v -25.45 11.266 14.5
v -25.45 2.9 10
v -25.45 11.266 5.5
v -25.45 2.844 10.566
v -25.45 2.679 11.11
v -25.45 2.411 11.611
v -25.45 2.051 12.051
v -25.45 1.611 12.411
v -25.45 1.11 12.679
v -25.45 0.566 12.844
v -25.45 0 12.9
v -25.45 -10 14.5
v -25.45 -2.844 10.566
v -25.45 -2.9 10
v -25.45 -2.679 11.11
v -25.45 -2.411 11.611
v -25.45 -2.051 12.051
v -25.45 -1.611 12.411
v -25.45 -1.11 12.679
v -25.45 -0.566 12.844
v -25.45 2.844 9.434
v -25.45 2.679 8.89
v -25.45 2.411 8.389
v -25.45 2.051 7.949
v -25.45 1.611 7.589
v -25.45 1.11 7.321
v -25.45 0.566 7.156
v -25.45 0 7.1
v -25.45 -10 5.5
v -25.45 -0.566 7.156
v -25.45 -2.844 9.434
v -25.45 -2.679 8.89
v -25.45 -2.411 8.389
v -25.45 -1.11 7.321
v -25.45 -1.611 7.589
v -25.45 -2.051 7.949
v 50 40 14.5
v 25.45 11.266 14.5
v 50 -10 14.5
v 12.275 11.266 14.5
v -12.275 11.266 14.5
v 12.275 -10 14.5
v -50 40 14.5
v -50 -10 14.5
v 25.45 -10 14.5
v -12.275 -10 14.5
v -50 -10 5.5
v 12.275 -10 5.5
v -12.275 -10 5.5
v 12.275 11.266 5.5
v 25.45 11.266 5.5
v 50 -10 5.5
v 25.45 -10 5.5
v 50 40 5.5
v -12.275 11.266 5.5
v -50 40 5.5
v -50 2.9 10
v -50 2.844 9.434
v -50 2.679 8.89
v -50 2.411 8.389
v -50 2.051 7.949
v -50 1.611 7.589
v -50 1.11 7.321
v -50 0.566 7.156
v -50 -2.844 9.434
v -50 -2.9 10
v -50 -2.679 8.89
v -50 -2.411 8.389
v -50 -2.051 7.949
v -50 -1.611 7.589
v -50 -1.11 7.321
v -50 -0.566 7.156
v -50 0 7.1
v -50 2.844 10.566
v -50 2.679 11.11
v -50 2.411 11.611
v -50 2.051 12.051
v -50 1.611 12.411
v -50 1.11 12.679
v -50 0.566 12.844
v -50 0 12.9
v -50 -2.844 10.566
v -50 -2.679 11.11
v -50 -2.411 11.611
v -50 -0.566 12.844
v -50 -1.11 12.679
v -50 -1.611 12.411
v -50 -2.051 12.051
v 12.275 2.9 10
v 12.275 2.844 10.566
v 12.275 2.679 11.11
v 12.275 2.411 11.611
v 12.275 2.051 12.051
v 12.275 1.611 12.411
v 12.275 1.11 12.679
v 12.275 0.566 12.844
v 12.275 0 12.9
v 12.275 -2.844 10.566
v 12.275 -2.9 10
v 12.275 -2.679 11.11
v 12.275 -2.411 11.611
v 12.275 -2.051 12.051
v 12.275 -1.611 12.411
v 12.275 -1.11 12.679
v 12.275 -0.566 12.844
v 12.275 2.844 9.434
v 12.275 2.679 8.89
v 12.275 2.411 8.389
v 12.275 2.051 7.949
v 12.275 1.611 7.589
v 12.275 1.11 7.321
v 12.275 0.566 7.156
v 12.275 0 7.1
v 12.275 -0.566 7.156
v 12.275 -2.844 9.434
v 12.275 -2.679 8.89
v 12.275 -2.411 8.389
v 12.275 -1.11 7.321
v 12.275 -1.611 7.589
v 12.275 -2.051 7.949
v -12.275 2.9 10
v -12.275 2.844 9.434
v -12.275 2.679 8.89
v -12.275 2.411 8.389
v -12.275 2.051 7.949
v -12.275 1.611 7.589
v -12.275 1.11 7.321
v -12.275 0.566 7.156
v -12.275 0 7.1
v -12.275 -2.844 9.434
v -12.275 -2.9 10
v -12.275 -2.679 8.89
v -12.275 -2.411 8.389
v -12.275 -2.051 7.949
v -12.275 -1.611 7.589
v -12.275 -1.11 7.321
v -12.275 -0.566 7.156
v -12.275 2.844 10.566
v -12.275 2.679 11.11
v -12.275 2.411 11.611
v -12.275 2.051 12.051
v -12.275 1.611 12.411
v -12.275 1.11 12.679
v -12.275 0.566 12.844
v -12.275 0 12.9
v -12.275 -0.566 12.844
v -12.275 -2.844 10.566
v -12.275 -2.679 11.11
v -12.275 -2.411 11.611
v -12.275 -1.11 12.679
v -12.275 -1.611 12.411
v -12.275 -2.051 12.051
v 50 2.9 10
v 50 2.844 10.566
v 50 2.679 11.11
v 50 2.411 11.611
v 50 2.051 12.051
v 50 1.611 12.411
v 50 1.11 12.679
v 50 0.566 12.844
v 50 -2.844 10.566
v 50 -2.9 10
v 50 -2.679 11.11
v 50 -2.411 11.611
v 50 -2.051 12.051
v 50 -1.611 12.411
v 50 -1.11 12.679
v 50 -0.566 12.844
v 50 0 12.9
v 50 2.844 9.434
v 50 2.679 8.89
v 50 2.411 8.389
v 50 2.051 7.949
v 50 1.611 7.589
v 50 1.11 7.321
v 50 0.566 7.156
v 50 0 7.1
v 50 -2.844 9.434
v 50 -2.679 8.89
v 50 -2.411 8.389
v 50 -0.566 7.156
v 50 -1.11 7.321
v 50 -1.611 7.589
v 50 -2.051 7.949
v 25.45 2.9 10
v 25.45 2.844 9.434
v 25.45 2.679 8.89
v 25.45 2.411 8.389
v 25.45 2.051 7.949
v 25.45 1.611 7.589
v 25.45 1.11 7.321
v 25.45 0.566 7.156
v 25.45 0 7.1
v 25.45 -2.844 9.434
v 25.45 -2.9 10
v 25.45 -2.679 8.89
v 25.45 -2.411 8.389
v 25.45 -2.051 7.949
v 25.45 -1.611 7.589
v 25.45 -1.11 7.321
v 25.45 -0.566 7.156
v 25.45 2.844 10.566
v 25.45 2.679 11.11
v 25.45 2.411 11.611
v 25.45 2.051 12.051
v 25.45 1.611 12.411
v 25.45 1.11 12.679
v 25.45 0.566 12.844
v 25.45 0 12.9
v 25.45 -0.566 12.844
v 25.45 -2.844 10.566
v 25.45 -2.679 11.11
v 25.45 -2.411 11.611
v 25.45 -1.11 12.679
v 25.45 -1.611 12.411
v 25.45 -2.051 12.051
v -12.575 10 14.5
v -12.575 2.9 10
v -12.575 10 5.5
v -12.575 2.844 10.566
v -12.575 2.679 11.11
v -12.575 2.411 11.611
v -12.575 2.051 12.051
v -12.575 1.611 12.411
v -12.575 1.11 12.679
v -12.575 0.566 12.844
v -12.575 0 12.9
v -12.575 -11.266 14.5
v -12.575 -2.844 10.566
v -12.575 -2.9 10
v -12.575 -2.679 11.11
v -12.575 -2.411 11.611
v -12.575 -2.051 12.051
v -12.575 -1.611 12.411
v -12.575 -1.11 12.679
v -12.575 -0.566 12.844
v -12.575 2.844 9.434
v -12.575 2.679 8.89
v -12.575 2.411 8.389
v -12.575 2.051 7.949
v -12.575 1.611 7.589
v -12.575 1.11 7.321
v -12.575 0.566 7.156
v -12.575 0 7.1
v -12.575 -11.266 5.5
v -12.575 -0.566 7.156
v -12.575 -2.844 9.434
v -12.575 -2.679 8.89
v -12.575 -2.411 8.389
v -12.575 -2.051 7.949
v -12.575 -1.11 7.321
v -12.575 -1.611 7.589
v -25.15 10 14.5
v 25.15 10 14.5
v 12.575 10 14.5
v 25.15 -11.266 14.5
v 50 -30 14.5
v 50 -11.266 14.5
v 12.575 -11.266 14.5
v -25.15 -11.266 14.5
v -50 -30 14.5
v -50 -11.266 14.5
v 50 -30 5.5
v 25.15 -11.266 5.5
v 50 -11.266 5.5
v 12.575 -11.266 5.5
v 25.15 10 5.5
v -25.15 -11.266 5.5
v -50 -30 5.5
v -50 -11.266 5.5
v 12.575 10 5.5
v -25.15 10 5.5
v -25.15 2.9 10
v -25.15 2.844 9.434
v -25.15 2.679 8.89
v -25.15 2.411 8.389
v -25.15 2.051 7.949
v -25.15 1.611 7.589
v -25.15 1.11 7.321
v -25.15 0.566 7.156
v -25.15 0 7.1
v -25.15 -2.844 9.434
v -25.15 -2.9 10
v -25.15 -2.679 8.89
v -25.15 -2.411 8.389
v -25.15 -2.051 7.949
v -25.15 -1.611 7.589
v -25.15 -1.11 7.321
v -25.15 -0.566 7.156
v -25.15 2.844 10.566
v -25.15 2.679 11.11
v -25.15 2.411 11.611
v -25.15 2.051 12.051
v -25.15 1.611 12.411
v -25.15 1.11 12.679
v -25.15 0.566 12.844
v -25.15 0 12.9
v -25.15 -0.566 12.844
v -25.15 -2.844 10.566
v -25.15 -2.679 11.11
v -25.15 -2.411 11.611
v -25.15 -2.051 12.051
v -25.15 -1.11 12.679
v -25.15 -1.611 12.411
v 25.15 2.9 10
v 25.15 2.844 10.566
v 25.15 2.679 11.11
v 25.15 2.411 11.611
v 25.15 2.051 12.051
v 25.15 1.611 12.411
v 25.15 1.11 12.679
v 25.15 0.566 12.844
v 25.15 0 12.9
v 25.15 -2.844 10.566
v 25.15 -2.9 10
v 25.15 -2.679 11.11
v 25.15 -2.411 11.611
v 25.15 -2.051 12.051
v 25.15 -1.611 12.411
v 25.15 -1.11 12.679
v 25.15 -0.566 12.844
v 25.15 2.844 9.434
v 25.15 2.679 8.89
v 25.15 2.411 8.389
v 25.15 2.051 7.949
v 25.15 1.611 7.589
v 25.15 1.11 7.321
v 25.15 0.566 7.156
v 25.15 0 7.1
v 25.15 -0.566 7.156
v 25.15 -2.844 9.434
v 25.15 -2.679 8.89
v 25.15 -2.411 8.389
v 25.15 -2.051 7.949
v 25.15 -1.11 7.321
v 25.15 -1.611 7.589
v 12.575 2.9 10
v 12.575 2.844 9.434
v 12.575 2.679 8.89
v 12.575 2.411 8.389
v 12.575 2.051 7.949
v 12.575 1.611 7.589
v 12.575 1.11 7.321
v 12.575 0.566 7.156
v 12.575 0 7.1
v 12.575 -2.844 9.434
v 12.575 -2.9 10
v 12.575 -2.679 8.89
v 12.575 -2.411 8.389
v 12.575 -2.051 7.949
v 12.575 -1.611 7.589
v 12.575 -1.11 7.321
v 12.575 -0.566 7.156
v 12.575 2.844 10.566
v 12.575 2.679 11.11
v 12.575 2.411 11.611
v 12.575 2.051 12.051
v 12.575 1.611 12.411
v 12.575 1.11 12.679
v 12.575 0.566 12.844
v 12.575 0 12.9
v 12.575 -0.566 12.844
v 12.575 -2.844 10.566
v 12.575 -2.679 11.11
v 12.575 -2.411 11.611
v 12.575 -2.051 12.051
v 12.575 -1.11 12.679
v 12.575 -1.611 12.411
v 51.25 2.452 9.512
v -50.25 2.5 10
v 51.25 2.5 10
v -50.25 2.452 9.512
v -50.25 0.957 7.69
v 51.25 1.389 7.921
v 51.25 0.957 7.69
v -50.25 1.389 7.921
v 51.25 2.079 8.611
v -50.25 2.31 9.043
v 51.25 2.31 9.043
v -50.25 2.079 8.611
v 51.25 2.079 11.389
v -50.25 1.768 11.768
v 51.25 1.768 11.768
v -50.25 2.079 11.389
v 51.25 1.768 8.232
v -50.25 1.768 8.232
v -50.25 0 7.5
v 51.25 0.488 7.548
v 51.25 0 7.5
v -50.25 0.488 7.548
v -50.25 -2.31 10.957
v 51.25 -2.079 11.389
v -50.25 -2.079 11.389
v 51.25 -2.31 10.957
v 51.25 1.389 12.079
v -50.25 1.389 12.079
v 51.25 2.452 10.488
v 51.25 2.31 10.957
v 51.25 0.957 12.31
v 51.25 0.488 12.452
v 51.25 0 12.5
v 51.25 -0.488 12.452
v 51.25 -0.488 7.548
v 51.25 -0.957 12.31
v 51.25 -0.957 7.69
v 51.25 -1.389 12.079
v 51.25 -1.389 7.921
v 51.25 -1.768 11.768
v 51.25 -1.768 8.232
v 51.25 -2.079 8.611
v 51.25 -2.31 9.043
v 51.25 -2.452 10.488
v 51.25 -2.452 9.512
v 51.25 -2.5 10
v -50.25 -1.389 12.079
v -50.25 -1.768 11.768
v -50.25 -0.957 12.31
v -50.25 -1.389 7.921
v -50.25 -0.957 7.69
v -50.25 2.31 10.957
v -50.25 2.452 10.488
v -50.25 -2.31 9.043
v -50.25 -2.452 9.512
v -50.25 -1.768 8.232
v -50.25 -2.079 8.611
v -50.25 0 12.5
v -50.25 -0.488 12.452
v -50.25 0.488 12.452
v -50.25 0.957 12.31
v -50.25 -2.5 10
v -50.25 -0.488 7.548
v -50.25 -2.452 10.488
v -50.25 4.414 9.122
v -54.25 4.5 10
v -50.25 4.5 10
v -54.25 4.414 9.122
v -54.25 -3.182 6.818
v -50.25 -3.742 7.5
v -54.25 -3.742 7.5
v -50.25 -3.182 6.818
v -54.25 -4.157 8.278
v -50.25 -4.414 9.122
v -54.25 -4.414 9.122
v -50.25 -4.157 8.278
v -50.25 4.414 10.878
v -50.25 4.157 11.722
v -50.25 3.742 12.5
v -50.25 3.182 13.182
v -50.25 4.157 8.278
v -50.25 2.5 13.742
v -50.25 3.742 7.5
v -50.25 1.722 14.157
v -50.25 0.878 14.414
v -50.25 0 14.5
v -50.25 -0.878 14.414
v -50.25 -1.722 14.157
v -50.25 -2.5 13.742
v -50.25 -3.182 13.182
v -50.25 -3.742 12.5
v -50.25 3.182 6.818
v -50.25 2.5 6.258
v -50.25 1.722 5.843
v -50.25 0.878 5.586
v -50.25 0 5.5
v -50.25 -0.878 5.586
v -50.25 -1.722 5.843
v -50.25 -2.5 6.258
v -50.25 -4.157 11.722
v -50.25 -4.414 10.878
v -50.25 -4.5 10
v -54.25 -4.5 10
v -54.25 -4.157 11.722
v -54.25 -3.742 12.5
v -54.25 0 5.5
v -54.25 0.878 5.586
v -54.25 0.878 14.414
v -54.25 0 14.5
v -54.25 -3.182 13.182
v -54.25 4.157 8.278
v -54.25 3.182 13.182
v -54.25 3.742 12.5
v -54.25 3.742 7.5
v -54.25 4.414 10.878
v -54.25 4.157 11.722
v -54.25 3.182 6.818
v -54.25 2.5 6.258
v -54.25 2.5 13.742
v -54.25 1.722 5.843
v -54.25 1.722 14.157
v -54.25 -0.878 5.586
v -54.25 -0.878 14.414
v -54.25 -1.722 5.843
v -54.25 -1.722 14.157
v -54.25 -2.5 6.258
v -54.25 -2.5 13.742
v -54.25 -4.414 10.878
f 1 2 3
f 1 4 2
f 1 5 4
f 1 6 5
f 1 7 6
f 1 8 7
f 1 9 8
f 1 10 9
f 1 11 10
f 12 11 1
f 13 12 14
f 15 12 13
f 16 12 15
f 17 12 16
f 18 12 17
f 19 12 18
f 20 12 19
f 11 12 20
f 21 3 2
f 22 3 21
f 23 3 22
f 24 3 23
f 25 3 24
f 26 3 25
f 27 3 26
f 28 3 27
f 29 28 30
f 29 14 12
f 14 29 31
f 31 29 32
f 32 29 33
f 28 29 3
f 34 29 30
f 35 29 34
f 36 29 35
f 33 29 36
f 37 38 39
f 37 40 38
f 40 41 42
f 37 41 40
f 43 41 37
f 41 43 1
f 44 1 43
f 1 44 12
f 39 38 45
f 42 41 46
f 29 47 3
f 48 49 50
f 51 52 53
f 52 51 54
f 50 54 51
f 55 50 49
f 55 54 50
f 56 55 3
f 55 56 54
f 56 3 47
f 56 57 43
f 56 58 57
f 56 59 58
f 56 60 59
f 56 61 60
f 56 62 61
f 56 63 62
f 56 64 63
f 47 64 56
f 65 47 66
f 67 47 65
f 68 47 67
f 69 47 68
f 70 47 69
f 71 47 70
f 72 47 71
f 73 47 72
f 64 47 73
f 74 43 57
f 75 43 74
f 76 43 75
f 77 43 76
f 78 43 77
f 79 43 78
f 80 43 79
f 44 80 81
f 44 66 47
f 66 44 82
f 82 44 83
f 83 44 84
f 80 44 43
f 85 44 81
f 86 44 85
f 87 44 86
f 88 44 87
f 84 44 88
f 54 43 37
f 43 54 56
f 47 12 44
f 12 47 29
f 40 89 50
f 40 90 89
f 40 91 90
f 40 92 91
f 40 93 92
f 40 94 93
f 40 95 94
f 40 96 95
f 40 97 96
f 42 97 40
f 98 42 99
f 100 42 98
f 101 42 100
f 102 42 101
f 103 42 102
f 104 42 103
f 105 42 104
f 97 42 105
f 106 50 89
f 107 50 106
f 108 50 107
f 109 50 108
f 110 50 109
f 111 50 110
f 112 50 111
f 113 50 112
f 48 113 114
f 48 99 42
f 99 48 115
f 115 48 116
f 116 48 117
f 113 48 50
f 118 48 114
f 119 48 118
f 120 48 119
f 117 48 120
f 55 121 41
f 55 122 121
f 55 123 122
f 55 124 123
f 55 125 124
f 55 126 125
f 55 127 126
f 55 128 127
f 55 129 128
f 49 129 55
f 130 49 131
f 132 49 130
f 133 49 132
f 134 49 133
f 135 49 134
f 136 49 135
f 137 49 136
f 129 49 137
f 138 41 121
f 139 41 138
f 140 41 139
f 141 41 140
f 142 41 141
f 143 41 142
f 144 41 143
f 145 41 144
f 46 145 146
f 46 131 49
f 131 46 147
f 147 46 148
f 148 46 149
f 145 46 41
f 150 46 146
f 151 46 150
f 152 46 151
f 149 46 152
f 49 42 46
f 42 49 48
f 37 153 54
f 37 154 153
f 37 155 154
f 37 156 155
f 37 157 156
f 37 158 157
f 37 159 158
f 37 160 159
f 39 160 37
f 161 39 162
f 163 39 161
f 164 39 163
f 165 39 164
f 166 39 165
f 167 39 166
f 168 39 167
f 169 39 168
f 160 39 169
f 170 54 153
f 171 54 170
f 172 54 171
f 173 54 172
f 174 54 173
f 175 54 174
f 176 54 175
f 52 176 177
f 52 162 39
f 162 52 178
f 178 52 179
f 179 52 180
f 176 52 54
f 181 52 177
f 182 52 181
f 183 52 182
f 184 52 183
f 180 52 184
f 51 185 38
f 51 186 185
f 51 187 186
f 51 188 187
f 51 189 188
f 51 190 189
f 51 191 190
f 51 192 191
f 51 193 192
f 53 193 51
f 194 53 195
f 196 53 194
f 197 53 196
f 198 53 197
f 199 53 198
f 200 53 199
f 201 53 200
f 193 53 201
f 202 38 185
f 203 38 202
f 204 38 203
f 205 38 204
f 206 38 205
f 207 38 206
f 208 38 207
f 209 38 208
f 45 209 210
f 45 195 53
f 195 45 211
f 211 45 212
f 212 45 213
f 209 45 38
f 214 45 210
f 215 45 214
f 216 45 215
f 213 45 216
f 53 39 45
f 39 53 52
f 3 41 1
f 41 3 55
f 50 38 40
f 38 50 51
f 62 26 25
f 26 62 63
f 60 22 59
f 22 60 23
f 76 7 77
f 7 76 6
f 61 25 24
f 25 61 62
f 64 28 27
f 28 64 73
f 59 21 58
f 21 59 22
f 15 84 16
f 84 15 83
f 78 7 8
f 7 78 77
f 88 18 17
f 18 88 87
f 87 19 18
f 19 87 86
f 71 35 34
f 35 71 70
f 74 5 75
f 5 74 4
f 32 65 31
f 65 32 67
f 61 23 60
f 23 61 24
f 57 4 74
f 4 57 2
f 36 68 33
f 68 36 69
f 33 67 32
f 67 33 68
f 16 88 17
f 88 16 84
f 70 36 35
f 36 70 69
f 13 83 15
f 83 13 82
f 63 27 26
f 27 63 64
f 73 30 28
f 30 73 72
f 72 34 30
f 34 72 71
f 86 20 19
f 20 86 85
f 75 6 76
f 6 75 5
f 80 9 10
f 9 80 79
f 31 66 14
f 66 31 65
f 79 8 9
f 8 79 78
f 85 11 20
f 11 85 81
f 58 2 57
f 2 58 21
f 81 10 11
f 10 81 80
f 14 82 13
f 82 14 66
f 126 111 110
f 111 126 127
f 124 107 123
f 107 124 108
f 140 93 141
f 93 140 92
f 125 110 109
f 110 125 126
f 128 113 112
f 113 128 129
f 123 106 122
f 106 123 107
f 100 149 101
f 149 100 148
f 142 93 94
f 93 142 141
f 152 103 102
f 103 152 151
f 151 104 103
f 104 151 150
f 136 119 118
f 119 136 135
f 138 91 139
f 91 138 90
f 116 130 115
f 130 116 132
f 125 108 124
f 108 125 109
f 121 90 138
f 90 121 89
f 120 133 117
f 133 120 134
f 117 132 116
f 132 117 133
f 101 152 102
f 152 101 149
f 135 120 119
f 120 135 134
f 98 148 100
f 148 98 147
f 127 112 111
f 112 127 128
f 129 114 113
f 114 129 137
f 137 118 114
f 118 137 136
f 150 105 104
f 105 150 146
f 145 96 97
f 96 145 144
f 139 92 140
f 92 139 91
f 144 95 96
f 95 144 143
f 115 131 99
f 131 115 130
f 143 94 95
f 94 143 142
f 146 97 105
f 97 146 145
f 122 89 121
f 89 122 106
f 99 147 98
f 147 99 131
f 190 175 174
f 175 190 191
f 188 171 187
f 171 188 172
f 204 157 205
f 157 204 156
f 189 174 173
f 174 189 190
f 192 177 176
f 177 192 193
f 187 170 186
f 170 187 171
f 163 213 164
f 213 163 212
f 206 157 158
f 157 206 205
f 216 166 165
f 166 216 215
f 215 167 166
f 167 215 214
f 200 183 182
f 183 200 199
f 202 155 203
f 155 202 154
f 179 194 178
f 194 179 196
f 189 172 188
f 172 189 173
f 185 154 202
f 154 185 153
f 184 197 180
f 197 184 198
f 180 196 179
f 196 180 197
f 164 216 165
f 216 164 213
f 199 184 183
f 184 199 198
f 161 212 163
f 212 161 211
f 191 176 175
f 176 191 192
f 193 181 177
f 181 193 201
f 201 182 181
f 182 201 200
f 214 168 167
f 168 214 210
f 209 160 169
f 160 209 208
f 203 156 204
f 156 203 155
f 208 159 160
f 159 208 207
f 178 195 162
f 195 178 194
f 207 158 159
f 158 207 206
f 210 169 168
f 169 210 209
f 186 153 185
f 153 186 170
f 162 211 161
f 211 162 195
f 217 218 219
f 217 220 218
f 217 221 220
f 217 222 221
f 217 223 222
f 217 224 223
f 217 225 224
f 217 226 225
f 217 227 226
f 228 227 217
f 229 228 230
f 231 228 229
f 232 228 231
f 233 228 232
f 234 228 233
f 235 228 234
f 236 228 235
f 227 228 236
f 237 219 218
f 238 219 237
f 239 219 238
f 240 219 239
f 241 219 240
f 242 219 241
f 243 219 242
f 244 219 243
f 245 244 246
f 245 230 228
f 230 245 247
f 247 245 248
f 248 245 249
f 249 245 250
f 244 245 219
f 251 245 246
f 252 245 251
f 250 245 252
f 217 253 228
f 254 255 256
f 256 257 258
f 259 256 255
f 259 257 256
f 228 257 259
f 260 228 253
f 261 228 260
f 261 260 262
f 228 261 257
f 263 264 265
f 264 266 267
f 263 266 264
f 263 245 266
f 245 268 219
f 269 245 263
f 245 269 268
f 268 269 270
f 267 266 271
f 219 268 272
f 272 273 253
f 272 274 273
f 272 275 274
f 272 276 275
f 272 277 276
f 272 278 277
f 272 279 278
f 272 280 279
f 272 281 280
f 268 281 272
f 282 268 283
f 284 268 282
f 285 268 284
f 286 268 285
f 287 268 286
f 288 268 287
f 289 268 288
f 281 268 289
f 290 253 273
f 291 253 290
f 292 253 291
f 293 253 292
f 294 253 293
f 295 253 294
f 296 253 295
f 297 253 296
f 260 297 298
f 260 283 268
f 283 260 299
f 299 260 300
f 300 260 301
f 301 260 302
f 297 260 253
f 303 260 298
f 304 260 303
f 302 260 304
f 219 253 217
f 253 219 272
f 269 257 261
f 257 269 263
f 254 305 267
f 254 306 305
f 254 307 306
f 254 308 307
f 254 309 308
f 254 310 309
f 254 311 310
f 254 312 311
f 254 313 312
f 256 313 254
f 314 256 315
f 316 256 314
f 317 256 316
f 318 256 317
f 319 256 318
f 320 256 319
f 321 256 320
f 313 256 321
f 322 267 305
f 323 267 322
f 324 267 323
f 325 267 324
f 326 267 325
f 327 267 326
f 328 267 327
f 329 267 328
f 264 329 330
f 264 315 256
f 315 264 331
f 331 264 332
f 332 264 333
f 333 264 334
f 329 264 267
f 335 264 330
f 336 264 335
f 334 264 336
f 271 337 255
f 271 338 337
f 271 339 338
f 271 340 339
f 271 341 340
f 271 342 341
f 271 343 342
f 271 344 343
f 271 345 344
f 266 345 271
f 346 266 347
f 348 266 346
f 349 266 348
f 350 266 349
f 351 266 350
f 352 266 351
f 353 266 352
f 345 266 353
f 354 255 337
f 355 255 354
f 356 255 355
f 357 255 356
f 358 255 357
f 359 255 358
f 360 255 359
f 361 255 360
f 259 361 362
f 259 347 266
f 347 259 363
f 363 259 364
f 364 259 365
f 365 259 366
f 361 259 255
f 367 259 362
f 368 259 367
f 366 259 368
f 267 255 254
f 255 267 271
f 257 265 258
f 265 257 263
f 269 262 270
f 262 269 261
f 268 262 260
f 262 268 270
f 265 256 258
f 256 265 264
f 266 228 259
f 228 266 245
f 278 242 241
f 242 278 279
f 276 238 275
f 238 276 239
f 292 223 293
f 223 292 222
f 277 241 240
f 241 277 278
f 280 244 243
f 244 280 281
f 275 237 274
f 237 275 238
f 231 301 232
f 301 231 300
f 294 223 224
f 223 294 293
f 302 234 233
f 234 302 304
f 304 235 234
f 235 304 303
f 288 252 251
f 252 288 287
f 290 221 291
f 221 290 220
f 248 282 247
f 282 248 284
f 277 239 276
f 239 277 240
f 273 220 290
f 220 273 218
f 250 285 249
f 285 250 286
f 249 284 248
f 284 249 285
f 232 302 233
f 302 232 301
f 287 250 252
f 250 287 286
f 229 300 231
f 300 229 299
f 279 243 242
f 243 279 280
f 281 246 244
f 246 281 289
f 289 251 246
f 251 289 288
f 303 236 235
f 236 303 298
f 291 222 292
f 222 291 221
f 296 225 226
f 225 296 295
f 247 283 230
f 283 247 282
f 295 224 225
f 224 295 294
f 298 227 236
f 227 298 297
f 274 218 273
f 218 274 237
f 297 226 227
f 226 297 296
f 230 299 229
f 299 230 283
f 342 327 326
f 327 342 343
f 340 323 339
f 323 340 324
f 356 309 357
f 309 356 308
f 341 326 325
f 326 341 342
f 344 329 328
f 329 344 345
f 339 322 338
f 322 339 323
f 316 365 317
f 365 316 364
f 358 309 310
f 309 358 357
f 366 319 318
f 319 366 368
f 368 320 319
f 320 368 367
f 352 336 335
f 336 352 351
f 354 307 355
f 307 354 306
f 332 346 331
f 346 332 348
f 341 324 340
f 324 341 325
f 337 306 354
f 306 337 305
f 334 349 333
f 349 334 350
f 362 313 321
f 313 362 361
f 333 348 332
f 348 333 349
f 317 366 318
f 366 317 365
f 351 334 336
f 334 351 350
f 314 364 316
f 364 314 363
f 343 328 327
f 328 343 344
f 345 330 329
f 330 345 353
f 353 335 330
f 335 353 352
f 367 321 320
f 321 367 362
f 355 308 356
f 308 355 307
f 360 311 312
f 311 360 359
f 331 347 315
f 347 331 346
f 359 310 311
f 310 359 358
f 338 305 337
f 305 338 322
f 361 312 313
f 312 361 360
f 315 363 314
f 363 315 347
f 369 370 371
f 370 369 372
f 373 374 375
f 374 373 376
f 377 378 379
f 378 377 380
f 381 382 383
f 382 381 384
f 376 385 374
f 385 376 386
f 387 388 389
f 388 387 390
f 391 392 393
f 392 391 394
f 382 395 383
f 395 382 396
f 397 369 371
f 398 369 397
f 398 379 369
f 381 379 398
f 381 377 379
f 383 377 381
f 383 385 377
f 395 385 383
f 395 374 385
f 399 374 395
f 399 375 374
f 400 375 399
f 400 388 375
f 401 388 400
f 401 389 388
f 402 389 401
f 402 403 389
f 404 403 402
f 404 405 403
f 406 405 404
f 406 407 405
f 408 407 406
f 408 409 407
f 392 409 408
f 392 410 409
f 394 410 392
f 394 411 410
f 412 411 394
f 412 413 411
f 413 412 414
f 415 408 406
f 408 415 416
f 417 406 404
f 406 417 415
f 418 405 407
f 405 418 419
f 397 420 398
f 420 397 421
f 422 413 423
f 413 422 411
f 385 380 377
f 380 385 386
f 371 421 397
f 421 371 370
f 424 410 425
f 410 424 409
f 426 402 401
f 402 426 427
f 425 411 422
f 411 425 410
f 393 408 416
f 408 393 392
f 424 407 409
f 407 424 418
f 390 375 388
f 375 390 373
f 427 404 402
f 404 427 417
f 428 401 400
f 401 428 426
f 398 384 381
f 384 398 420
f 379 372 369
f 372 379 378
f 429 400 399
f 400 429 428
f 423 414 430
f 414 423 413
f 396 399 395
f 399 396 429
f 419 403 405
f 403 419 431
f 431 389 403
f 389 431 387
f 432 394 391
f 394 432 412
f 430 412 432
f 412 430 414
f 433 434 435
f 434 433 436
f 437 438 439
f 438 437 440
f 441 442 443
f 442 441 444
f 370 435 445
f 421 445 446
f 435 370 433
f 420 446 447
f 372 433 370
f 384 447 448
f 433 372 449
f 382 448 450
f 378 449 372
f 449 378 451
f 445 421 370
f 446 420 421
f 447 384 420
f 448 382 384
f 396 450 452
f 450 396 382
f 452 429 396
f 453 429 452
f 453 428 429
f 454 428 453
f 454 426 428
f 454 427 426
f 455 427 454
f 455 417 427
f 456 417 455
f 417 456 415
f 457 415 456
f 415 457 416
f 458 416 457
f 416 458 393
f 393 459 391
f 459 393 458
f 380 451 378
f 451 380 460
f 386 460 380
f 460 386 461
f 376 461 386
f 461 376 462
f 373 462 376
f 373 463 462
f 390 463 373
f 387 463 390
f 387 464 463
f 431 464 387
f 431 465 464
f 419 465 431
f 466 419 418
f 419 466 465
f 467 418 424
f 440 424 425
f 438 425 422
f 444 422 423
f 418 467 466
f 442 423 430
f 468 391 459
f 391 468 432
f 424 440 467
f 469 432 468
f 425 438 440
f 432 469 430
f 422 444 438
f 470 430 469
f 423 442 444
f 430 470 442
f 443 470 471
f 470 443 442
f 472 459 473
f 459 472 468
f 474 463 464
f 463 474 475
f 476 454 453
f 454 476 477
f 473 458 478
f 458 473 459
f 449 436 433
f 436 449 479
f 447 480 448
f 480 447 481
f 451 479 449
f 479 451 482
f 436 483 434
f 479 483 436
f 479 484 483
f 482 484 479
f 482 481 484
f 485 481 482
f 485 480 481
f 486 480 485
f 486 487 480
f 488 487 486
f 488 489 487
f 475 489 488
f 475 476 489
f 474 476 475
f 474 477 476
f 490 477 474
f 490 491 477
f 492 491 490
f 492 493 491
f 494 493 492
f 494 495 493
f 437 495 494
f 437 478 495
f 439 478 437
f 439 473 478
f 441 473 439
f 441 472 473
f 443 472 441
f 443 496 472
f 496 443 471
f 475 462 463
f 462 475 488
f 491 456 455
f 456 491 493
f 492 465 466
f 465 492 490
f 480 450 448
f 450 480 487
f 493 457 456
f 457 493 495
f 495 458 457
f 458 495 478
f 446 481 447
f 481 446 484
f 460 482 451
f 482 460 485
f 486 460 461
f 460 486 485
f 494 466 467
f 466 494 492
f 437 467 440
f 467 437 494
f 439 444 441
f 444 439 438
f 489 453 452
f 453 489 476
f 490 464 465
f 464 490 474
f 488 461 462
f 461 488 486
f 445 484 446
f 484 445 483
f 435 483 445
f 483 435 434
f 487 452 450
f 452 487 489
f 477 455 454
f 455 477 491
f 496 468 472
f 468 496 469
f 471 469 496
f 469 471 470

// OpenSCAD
$fn = 32;

// ------------------------------------------------------------------------
// Butt hinge: hinge 100 mm, leaf swung 0 deg
// Every part is its own module, assembly() places every instance.
// ------------------------------------------------------------------------

// --- part 1 ---
module hinge_base() {
  difference() {
    union() {
      translate([-50, -10, -4.5]) cube([24.55, 50, 9]);
      translate([-12.275, -10, -4.5]) cube([24.55, 50, 9]);
      translate([25.45, -10, -4.5]) cube([24.55, 50, 9]);
      translate([-50, 11.266, -4.5]) cube([100, 28.734, 9]);
    }
    translate([-37.725, 0, 0]) rotate([0, 90, 0]) cylinder(h = 26.55, d = 5.8, center = true);
    translate([0, 0, 0]) rotate([0, 90, 0]) cylinder(h = 26.55, d = 5.8, center = true);
    translate([37.725, 0, 0]) rotate([0, 90, 0]) cylinder(h = 26.55, d = 5.8, center = true);
  }
}

// --- part 2 ---
module hinge_mover() {
  difference() {
    union() {
      translate([-25.15, -30, -4.5]) cube([12.575, 40, 9]);
      translate([12.575, -30, -4.5]) cube([12.575, 40, 9]);
      translate([-50, -30, -4.5]) cube([100, 18.734, 9]);
    }
    translate([-18.863, 0, 0]) rotate([0, 90, 0]) cylinder(h = 14.575, d = 5.8, center = true);
    translate([18.863, 0, 0]) rotate([0, 90, 0]) cylinder(h = 14.575, d = 5.8, center = true);
  }
}

// --- part 3 ---
module hinge_pin() {
  rotate([0, 90, 0]) cylinder(h = 102.5, d = 5, center = true);
  translate([-54.25, 0, 0]) rotate([0, 90, 0]) cylinder(h = 4, d = 9);
}

// --- assembly ---
module assembly() {
  color([0.80, 0.24, 0.20]) translate([0, 0, 10]) rotate([0, 0, 0]) hinge_base();
  color([0.20, 0.45, 0.75]) translate([0, 0, 10]) rotate([0, 0, 0]) hinge_mover();
  color([0.25, 0.62, 0.32]) translate([0, 0, 10]) rotate([0, 0, 0]) hinge_pin();
}

assembly();
